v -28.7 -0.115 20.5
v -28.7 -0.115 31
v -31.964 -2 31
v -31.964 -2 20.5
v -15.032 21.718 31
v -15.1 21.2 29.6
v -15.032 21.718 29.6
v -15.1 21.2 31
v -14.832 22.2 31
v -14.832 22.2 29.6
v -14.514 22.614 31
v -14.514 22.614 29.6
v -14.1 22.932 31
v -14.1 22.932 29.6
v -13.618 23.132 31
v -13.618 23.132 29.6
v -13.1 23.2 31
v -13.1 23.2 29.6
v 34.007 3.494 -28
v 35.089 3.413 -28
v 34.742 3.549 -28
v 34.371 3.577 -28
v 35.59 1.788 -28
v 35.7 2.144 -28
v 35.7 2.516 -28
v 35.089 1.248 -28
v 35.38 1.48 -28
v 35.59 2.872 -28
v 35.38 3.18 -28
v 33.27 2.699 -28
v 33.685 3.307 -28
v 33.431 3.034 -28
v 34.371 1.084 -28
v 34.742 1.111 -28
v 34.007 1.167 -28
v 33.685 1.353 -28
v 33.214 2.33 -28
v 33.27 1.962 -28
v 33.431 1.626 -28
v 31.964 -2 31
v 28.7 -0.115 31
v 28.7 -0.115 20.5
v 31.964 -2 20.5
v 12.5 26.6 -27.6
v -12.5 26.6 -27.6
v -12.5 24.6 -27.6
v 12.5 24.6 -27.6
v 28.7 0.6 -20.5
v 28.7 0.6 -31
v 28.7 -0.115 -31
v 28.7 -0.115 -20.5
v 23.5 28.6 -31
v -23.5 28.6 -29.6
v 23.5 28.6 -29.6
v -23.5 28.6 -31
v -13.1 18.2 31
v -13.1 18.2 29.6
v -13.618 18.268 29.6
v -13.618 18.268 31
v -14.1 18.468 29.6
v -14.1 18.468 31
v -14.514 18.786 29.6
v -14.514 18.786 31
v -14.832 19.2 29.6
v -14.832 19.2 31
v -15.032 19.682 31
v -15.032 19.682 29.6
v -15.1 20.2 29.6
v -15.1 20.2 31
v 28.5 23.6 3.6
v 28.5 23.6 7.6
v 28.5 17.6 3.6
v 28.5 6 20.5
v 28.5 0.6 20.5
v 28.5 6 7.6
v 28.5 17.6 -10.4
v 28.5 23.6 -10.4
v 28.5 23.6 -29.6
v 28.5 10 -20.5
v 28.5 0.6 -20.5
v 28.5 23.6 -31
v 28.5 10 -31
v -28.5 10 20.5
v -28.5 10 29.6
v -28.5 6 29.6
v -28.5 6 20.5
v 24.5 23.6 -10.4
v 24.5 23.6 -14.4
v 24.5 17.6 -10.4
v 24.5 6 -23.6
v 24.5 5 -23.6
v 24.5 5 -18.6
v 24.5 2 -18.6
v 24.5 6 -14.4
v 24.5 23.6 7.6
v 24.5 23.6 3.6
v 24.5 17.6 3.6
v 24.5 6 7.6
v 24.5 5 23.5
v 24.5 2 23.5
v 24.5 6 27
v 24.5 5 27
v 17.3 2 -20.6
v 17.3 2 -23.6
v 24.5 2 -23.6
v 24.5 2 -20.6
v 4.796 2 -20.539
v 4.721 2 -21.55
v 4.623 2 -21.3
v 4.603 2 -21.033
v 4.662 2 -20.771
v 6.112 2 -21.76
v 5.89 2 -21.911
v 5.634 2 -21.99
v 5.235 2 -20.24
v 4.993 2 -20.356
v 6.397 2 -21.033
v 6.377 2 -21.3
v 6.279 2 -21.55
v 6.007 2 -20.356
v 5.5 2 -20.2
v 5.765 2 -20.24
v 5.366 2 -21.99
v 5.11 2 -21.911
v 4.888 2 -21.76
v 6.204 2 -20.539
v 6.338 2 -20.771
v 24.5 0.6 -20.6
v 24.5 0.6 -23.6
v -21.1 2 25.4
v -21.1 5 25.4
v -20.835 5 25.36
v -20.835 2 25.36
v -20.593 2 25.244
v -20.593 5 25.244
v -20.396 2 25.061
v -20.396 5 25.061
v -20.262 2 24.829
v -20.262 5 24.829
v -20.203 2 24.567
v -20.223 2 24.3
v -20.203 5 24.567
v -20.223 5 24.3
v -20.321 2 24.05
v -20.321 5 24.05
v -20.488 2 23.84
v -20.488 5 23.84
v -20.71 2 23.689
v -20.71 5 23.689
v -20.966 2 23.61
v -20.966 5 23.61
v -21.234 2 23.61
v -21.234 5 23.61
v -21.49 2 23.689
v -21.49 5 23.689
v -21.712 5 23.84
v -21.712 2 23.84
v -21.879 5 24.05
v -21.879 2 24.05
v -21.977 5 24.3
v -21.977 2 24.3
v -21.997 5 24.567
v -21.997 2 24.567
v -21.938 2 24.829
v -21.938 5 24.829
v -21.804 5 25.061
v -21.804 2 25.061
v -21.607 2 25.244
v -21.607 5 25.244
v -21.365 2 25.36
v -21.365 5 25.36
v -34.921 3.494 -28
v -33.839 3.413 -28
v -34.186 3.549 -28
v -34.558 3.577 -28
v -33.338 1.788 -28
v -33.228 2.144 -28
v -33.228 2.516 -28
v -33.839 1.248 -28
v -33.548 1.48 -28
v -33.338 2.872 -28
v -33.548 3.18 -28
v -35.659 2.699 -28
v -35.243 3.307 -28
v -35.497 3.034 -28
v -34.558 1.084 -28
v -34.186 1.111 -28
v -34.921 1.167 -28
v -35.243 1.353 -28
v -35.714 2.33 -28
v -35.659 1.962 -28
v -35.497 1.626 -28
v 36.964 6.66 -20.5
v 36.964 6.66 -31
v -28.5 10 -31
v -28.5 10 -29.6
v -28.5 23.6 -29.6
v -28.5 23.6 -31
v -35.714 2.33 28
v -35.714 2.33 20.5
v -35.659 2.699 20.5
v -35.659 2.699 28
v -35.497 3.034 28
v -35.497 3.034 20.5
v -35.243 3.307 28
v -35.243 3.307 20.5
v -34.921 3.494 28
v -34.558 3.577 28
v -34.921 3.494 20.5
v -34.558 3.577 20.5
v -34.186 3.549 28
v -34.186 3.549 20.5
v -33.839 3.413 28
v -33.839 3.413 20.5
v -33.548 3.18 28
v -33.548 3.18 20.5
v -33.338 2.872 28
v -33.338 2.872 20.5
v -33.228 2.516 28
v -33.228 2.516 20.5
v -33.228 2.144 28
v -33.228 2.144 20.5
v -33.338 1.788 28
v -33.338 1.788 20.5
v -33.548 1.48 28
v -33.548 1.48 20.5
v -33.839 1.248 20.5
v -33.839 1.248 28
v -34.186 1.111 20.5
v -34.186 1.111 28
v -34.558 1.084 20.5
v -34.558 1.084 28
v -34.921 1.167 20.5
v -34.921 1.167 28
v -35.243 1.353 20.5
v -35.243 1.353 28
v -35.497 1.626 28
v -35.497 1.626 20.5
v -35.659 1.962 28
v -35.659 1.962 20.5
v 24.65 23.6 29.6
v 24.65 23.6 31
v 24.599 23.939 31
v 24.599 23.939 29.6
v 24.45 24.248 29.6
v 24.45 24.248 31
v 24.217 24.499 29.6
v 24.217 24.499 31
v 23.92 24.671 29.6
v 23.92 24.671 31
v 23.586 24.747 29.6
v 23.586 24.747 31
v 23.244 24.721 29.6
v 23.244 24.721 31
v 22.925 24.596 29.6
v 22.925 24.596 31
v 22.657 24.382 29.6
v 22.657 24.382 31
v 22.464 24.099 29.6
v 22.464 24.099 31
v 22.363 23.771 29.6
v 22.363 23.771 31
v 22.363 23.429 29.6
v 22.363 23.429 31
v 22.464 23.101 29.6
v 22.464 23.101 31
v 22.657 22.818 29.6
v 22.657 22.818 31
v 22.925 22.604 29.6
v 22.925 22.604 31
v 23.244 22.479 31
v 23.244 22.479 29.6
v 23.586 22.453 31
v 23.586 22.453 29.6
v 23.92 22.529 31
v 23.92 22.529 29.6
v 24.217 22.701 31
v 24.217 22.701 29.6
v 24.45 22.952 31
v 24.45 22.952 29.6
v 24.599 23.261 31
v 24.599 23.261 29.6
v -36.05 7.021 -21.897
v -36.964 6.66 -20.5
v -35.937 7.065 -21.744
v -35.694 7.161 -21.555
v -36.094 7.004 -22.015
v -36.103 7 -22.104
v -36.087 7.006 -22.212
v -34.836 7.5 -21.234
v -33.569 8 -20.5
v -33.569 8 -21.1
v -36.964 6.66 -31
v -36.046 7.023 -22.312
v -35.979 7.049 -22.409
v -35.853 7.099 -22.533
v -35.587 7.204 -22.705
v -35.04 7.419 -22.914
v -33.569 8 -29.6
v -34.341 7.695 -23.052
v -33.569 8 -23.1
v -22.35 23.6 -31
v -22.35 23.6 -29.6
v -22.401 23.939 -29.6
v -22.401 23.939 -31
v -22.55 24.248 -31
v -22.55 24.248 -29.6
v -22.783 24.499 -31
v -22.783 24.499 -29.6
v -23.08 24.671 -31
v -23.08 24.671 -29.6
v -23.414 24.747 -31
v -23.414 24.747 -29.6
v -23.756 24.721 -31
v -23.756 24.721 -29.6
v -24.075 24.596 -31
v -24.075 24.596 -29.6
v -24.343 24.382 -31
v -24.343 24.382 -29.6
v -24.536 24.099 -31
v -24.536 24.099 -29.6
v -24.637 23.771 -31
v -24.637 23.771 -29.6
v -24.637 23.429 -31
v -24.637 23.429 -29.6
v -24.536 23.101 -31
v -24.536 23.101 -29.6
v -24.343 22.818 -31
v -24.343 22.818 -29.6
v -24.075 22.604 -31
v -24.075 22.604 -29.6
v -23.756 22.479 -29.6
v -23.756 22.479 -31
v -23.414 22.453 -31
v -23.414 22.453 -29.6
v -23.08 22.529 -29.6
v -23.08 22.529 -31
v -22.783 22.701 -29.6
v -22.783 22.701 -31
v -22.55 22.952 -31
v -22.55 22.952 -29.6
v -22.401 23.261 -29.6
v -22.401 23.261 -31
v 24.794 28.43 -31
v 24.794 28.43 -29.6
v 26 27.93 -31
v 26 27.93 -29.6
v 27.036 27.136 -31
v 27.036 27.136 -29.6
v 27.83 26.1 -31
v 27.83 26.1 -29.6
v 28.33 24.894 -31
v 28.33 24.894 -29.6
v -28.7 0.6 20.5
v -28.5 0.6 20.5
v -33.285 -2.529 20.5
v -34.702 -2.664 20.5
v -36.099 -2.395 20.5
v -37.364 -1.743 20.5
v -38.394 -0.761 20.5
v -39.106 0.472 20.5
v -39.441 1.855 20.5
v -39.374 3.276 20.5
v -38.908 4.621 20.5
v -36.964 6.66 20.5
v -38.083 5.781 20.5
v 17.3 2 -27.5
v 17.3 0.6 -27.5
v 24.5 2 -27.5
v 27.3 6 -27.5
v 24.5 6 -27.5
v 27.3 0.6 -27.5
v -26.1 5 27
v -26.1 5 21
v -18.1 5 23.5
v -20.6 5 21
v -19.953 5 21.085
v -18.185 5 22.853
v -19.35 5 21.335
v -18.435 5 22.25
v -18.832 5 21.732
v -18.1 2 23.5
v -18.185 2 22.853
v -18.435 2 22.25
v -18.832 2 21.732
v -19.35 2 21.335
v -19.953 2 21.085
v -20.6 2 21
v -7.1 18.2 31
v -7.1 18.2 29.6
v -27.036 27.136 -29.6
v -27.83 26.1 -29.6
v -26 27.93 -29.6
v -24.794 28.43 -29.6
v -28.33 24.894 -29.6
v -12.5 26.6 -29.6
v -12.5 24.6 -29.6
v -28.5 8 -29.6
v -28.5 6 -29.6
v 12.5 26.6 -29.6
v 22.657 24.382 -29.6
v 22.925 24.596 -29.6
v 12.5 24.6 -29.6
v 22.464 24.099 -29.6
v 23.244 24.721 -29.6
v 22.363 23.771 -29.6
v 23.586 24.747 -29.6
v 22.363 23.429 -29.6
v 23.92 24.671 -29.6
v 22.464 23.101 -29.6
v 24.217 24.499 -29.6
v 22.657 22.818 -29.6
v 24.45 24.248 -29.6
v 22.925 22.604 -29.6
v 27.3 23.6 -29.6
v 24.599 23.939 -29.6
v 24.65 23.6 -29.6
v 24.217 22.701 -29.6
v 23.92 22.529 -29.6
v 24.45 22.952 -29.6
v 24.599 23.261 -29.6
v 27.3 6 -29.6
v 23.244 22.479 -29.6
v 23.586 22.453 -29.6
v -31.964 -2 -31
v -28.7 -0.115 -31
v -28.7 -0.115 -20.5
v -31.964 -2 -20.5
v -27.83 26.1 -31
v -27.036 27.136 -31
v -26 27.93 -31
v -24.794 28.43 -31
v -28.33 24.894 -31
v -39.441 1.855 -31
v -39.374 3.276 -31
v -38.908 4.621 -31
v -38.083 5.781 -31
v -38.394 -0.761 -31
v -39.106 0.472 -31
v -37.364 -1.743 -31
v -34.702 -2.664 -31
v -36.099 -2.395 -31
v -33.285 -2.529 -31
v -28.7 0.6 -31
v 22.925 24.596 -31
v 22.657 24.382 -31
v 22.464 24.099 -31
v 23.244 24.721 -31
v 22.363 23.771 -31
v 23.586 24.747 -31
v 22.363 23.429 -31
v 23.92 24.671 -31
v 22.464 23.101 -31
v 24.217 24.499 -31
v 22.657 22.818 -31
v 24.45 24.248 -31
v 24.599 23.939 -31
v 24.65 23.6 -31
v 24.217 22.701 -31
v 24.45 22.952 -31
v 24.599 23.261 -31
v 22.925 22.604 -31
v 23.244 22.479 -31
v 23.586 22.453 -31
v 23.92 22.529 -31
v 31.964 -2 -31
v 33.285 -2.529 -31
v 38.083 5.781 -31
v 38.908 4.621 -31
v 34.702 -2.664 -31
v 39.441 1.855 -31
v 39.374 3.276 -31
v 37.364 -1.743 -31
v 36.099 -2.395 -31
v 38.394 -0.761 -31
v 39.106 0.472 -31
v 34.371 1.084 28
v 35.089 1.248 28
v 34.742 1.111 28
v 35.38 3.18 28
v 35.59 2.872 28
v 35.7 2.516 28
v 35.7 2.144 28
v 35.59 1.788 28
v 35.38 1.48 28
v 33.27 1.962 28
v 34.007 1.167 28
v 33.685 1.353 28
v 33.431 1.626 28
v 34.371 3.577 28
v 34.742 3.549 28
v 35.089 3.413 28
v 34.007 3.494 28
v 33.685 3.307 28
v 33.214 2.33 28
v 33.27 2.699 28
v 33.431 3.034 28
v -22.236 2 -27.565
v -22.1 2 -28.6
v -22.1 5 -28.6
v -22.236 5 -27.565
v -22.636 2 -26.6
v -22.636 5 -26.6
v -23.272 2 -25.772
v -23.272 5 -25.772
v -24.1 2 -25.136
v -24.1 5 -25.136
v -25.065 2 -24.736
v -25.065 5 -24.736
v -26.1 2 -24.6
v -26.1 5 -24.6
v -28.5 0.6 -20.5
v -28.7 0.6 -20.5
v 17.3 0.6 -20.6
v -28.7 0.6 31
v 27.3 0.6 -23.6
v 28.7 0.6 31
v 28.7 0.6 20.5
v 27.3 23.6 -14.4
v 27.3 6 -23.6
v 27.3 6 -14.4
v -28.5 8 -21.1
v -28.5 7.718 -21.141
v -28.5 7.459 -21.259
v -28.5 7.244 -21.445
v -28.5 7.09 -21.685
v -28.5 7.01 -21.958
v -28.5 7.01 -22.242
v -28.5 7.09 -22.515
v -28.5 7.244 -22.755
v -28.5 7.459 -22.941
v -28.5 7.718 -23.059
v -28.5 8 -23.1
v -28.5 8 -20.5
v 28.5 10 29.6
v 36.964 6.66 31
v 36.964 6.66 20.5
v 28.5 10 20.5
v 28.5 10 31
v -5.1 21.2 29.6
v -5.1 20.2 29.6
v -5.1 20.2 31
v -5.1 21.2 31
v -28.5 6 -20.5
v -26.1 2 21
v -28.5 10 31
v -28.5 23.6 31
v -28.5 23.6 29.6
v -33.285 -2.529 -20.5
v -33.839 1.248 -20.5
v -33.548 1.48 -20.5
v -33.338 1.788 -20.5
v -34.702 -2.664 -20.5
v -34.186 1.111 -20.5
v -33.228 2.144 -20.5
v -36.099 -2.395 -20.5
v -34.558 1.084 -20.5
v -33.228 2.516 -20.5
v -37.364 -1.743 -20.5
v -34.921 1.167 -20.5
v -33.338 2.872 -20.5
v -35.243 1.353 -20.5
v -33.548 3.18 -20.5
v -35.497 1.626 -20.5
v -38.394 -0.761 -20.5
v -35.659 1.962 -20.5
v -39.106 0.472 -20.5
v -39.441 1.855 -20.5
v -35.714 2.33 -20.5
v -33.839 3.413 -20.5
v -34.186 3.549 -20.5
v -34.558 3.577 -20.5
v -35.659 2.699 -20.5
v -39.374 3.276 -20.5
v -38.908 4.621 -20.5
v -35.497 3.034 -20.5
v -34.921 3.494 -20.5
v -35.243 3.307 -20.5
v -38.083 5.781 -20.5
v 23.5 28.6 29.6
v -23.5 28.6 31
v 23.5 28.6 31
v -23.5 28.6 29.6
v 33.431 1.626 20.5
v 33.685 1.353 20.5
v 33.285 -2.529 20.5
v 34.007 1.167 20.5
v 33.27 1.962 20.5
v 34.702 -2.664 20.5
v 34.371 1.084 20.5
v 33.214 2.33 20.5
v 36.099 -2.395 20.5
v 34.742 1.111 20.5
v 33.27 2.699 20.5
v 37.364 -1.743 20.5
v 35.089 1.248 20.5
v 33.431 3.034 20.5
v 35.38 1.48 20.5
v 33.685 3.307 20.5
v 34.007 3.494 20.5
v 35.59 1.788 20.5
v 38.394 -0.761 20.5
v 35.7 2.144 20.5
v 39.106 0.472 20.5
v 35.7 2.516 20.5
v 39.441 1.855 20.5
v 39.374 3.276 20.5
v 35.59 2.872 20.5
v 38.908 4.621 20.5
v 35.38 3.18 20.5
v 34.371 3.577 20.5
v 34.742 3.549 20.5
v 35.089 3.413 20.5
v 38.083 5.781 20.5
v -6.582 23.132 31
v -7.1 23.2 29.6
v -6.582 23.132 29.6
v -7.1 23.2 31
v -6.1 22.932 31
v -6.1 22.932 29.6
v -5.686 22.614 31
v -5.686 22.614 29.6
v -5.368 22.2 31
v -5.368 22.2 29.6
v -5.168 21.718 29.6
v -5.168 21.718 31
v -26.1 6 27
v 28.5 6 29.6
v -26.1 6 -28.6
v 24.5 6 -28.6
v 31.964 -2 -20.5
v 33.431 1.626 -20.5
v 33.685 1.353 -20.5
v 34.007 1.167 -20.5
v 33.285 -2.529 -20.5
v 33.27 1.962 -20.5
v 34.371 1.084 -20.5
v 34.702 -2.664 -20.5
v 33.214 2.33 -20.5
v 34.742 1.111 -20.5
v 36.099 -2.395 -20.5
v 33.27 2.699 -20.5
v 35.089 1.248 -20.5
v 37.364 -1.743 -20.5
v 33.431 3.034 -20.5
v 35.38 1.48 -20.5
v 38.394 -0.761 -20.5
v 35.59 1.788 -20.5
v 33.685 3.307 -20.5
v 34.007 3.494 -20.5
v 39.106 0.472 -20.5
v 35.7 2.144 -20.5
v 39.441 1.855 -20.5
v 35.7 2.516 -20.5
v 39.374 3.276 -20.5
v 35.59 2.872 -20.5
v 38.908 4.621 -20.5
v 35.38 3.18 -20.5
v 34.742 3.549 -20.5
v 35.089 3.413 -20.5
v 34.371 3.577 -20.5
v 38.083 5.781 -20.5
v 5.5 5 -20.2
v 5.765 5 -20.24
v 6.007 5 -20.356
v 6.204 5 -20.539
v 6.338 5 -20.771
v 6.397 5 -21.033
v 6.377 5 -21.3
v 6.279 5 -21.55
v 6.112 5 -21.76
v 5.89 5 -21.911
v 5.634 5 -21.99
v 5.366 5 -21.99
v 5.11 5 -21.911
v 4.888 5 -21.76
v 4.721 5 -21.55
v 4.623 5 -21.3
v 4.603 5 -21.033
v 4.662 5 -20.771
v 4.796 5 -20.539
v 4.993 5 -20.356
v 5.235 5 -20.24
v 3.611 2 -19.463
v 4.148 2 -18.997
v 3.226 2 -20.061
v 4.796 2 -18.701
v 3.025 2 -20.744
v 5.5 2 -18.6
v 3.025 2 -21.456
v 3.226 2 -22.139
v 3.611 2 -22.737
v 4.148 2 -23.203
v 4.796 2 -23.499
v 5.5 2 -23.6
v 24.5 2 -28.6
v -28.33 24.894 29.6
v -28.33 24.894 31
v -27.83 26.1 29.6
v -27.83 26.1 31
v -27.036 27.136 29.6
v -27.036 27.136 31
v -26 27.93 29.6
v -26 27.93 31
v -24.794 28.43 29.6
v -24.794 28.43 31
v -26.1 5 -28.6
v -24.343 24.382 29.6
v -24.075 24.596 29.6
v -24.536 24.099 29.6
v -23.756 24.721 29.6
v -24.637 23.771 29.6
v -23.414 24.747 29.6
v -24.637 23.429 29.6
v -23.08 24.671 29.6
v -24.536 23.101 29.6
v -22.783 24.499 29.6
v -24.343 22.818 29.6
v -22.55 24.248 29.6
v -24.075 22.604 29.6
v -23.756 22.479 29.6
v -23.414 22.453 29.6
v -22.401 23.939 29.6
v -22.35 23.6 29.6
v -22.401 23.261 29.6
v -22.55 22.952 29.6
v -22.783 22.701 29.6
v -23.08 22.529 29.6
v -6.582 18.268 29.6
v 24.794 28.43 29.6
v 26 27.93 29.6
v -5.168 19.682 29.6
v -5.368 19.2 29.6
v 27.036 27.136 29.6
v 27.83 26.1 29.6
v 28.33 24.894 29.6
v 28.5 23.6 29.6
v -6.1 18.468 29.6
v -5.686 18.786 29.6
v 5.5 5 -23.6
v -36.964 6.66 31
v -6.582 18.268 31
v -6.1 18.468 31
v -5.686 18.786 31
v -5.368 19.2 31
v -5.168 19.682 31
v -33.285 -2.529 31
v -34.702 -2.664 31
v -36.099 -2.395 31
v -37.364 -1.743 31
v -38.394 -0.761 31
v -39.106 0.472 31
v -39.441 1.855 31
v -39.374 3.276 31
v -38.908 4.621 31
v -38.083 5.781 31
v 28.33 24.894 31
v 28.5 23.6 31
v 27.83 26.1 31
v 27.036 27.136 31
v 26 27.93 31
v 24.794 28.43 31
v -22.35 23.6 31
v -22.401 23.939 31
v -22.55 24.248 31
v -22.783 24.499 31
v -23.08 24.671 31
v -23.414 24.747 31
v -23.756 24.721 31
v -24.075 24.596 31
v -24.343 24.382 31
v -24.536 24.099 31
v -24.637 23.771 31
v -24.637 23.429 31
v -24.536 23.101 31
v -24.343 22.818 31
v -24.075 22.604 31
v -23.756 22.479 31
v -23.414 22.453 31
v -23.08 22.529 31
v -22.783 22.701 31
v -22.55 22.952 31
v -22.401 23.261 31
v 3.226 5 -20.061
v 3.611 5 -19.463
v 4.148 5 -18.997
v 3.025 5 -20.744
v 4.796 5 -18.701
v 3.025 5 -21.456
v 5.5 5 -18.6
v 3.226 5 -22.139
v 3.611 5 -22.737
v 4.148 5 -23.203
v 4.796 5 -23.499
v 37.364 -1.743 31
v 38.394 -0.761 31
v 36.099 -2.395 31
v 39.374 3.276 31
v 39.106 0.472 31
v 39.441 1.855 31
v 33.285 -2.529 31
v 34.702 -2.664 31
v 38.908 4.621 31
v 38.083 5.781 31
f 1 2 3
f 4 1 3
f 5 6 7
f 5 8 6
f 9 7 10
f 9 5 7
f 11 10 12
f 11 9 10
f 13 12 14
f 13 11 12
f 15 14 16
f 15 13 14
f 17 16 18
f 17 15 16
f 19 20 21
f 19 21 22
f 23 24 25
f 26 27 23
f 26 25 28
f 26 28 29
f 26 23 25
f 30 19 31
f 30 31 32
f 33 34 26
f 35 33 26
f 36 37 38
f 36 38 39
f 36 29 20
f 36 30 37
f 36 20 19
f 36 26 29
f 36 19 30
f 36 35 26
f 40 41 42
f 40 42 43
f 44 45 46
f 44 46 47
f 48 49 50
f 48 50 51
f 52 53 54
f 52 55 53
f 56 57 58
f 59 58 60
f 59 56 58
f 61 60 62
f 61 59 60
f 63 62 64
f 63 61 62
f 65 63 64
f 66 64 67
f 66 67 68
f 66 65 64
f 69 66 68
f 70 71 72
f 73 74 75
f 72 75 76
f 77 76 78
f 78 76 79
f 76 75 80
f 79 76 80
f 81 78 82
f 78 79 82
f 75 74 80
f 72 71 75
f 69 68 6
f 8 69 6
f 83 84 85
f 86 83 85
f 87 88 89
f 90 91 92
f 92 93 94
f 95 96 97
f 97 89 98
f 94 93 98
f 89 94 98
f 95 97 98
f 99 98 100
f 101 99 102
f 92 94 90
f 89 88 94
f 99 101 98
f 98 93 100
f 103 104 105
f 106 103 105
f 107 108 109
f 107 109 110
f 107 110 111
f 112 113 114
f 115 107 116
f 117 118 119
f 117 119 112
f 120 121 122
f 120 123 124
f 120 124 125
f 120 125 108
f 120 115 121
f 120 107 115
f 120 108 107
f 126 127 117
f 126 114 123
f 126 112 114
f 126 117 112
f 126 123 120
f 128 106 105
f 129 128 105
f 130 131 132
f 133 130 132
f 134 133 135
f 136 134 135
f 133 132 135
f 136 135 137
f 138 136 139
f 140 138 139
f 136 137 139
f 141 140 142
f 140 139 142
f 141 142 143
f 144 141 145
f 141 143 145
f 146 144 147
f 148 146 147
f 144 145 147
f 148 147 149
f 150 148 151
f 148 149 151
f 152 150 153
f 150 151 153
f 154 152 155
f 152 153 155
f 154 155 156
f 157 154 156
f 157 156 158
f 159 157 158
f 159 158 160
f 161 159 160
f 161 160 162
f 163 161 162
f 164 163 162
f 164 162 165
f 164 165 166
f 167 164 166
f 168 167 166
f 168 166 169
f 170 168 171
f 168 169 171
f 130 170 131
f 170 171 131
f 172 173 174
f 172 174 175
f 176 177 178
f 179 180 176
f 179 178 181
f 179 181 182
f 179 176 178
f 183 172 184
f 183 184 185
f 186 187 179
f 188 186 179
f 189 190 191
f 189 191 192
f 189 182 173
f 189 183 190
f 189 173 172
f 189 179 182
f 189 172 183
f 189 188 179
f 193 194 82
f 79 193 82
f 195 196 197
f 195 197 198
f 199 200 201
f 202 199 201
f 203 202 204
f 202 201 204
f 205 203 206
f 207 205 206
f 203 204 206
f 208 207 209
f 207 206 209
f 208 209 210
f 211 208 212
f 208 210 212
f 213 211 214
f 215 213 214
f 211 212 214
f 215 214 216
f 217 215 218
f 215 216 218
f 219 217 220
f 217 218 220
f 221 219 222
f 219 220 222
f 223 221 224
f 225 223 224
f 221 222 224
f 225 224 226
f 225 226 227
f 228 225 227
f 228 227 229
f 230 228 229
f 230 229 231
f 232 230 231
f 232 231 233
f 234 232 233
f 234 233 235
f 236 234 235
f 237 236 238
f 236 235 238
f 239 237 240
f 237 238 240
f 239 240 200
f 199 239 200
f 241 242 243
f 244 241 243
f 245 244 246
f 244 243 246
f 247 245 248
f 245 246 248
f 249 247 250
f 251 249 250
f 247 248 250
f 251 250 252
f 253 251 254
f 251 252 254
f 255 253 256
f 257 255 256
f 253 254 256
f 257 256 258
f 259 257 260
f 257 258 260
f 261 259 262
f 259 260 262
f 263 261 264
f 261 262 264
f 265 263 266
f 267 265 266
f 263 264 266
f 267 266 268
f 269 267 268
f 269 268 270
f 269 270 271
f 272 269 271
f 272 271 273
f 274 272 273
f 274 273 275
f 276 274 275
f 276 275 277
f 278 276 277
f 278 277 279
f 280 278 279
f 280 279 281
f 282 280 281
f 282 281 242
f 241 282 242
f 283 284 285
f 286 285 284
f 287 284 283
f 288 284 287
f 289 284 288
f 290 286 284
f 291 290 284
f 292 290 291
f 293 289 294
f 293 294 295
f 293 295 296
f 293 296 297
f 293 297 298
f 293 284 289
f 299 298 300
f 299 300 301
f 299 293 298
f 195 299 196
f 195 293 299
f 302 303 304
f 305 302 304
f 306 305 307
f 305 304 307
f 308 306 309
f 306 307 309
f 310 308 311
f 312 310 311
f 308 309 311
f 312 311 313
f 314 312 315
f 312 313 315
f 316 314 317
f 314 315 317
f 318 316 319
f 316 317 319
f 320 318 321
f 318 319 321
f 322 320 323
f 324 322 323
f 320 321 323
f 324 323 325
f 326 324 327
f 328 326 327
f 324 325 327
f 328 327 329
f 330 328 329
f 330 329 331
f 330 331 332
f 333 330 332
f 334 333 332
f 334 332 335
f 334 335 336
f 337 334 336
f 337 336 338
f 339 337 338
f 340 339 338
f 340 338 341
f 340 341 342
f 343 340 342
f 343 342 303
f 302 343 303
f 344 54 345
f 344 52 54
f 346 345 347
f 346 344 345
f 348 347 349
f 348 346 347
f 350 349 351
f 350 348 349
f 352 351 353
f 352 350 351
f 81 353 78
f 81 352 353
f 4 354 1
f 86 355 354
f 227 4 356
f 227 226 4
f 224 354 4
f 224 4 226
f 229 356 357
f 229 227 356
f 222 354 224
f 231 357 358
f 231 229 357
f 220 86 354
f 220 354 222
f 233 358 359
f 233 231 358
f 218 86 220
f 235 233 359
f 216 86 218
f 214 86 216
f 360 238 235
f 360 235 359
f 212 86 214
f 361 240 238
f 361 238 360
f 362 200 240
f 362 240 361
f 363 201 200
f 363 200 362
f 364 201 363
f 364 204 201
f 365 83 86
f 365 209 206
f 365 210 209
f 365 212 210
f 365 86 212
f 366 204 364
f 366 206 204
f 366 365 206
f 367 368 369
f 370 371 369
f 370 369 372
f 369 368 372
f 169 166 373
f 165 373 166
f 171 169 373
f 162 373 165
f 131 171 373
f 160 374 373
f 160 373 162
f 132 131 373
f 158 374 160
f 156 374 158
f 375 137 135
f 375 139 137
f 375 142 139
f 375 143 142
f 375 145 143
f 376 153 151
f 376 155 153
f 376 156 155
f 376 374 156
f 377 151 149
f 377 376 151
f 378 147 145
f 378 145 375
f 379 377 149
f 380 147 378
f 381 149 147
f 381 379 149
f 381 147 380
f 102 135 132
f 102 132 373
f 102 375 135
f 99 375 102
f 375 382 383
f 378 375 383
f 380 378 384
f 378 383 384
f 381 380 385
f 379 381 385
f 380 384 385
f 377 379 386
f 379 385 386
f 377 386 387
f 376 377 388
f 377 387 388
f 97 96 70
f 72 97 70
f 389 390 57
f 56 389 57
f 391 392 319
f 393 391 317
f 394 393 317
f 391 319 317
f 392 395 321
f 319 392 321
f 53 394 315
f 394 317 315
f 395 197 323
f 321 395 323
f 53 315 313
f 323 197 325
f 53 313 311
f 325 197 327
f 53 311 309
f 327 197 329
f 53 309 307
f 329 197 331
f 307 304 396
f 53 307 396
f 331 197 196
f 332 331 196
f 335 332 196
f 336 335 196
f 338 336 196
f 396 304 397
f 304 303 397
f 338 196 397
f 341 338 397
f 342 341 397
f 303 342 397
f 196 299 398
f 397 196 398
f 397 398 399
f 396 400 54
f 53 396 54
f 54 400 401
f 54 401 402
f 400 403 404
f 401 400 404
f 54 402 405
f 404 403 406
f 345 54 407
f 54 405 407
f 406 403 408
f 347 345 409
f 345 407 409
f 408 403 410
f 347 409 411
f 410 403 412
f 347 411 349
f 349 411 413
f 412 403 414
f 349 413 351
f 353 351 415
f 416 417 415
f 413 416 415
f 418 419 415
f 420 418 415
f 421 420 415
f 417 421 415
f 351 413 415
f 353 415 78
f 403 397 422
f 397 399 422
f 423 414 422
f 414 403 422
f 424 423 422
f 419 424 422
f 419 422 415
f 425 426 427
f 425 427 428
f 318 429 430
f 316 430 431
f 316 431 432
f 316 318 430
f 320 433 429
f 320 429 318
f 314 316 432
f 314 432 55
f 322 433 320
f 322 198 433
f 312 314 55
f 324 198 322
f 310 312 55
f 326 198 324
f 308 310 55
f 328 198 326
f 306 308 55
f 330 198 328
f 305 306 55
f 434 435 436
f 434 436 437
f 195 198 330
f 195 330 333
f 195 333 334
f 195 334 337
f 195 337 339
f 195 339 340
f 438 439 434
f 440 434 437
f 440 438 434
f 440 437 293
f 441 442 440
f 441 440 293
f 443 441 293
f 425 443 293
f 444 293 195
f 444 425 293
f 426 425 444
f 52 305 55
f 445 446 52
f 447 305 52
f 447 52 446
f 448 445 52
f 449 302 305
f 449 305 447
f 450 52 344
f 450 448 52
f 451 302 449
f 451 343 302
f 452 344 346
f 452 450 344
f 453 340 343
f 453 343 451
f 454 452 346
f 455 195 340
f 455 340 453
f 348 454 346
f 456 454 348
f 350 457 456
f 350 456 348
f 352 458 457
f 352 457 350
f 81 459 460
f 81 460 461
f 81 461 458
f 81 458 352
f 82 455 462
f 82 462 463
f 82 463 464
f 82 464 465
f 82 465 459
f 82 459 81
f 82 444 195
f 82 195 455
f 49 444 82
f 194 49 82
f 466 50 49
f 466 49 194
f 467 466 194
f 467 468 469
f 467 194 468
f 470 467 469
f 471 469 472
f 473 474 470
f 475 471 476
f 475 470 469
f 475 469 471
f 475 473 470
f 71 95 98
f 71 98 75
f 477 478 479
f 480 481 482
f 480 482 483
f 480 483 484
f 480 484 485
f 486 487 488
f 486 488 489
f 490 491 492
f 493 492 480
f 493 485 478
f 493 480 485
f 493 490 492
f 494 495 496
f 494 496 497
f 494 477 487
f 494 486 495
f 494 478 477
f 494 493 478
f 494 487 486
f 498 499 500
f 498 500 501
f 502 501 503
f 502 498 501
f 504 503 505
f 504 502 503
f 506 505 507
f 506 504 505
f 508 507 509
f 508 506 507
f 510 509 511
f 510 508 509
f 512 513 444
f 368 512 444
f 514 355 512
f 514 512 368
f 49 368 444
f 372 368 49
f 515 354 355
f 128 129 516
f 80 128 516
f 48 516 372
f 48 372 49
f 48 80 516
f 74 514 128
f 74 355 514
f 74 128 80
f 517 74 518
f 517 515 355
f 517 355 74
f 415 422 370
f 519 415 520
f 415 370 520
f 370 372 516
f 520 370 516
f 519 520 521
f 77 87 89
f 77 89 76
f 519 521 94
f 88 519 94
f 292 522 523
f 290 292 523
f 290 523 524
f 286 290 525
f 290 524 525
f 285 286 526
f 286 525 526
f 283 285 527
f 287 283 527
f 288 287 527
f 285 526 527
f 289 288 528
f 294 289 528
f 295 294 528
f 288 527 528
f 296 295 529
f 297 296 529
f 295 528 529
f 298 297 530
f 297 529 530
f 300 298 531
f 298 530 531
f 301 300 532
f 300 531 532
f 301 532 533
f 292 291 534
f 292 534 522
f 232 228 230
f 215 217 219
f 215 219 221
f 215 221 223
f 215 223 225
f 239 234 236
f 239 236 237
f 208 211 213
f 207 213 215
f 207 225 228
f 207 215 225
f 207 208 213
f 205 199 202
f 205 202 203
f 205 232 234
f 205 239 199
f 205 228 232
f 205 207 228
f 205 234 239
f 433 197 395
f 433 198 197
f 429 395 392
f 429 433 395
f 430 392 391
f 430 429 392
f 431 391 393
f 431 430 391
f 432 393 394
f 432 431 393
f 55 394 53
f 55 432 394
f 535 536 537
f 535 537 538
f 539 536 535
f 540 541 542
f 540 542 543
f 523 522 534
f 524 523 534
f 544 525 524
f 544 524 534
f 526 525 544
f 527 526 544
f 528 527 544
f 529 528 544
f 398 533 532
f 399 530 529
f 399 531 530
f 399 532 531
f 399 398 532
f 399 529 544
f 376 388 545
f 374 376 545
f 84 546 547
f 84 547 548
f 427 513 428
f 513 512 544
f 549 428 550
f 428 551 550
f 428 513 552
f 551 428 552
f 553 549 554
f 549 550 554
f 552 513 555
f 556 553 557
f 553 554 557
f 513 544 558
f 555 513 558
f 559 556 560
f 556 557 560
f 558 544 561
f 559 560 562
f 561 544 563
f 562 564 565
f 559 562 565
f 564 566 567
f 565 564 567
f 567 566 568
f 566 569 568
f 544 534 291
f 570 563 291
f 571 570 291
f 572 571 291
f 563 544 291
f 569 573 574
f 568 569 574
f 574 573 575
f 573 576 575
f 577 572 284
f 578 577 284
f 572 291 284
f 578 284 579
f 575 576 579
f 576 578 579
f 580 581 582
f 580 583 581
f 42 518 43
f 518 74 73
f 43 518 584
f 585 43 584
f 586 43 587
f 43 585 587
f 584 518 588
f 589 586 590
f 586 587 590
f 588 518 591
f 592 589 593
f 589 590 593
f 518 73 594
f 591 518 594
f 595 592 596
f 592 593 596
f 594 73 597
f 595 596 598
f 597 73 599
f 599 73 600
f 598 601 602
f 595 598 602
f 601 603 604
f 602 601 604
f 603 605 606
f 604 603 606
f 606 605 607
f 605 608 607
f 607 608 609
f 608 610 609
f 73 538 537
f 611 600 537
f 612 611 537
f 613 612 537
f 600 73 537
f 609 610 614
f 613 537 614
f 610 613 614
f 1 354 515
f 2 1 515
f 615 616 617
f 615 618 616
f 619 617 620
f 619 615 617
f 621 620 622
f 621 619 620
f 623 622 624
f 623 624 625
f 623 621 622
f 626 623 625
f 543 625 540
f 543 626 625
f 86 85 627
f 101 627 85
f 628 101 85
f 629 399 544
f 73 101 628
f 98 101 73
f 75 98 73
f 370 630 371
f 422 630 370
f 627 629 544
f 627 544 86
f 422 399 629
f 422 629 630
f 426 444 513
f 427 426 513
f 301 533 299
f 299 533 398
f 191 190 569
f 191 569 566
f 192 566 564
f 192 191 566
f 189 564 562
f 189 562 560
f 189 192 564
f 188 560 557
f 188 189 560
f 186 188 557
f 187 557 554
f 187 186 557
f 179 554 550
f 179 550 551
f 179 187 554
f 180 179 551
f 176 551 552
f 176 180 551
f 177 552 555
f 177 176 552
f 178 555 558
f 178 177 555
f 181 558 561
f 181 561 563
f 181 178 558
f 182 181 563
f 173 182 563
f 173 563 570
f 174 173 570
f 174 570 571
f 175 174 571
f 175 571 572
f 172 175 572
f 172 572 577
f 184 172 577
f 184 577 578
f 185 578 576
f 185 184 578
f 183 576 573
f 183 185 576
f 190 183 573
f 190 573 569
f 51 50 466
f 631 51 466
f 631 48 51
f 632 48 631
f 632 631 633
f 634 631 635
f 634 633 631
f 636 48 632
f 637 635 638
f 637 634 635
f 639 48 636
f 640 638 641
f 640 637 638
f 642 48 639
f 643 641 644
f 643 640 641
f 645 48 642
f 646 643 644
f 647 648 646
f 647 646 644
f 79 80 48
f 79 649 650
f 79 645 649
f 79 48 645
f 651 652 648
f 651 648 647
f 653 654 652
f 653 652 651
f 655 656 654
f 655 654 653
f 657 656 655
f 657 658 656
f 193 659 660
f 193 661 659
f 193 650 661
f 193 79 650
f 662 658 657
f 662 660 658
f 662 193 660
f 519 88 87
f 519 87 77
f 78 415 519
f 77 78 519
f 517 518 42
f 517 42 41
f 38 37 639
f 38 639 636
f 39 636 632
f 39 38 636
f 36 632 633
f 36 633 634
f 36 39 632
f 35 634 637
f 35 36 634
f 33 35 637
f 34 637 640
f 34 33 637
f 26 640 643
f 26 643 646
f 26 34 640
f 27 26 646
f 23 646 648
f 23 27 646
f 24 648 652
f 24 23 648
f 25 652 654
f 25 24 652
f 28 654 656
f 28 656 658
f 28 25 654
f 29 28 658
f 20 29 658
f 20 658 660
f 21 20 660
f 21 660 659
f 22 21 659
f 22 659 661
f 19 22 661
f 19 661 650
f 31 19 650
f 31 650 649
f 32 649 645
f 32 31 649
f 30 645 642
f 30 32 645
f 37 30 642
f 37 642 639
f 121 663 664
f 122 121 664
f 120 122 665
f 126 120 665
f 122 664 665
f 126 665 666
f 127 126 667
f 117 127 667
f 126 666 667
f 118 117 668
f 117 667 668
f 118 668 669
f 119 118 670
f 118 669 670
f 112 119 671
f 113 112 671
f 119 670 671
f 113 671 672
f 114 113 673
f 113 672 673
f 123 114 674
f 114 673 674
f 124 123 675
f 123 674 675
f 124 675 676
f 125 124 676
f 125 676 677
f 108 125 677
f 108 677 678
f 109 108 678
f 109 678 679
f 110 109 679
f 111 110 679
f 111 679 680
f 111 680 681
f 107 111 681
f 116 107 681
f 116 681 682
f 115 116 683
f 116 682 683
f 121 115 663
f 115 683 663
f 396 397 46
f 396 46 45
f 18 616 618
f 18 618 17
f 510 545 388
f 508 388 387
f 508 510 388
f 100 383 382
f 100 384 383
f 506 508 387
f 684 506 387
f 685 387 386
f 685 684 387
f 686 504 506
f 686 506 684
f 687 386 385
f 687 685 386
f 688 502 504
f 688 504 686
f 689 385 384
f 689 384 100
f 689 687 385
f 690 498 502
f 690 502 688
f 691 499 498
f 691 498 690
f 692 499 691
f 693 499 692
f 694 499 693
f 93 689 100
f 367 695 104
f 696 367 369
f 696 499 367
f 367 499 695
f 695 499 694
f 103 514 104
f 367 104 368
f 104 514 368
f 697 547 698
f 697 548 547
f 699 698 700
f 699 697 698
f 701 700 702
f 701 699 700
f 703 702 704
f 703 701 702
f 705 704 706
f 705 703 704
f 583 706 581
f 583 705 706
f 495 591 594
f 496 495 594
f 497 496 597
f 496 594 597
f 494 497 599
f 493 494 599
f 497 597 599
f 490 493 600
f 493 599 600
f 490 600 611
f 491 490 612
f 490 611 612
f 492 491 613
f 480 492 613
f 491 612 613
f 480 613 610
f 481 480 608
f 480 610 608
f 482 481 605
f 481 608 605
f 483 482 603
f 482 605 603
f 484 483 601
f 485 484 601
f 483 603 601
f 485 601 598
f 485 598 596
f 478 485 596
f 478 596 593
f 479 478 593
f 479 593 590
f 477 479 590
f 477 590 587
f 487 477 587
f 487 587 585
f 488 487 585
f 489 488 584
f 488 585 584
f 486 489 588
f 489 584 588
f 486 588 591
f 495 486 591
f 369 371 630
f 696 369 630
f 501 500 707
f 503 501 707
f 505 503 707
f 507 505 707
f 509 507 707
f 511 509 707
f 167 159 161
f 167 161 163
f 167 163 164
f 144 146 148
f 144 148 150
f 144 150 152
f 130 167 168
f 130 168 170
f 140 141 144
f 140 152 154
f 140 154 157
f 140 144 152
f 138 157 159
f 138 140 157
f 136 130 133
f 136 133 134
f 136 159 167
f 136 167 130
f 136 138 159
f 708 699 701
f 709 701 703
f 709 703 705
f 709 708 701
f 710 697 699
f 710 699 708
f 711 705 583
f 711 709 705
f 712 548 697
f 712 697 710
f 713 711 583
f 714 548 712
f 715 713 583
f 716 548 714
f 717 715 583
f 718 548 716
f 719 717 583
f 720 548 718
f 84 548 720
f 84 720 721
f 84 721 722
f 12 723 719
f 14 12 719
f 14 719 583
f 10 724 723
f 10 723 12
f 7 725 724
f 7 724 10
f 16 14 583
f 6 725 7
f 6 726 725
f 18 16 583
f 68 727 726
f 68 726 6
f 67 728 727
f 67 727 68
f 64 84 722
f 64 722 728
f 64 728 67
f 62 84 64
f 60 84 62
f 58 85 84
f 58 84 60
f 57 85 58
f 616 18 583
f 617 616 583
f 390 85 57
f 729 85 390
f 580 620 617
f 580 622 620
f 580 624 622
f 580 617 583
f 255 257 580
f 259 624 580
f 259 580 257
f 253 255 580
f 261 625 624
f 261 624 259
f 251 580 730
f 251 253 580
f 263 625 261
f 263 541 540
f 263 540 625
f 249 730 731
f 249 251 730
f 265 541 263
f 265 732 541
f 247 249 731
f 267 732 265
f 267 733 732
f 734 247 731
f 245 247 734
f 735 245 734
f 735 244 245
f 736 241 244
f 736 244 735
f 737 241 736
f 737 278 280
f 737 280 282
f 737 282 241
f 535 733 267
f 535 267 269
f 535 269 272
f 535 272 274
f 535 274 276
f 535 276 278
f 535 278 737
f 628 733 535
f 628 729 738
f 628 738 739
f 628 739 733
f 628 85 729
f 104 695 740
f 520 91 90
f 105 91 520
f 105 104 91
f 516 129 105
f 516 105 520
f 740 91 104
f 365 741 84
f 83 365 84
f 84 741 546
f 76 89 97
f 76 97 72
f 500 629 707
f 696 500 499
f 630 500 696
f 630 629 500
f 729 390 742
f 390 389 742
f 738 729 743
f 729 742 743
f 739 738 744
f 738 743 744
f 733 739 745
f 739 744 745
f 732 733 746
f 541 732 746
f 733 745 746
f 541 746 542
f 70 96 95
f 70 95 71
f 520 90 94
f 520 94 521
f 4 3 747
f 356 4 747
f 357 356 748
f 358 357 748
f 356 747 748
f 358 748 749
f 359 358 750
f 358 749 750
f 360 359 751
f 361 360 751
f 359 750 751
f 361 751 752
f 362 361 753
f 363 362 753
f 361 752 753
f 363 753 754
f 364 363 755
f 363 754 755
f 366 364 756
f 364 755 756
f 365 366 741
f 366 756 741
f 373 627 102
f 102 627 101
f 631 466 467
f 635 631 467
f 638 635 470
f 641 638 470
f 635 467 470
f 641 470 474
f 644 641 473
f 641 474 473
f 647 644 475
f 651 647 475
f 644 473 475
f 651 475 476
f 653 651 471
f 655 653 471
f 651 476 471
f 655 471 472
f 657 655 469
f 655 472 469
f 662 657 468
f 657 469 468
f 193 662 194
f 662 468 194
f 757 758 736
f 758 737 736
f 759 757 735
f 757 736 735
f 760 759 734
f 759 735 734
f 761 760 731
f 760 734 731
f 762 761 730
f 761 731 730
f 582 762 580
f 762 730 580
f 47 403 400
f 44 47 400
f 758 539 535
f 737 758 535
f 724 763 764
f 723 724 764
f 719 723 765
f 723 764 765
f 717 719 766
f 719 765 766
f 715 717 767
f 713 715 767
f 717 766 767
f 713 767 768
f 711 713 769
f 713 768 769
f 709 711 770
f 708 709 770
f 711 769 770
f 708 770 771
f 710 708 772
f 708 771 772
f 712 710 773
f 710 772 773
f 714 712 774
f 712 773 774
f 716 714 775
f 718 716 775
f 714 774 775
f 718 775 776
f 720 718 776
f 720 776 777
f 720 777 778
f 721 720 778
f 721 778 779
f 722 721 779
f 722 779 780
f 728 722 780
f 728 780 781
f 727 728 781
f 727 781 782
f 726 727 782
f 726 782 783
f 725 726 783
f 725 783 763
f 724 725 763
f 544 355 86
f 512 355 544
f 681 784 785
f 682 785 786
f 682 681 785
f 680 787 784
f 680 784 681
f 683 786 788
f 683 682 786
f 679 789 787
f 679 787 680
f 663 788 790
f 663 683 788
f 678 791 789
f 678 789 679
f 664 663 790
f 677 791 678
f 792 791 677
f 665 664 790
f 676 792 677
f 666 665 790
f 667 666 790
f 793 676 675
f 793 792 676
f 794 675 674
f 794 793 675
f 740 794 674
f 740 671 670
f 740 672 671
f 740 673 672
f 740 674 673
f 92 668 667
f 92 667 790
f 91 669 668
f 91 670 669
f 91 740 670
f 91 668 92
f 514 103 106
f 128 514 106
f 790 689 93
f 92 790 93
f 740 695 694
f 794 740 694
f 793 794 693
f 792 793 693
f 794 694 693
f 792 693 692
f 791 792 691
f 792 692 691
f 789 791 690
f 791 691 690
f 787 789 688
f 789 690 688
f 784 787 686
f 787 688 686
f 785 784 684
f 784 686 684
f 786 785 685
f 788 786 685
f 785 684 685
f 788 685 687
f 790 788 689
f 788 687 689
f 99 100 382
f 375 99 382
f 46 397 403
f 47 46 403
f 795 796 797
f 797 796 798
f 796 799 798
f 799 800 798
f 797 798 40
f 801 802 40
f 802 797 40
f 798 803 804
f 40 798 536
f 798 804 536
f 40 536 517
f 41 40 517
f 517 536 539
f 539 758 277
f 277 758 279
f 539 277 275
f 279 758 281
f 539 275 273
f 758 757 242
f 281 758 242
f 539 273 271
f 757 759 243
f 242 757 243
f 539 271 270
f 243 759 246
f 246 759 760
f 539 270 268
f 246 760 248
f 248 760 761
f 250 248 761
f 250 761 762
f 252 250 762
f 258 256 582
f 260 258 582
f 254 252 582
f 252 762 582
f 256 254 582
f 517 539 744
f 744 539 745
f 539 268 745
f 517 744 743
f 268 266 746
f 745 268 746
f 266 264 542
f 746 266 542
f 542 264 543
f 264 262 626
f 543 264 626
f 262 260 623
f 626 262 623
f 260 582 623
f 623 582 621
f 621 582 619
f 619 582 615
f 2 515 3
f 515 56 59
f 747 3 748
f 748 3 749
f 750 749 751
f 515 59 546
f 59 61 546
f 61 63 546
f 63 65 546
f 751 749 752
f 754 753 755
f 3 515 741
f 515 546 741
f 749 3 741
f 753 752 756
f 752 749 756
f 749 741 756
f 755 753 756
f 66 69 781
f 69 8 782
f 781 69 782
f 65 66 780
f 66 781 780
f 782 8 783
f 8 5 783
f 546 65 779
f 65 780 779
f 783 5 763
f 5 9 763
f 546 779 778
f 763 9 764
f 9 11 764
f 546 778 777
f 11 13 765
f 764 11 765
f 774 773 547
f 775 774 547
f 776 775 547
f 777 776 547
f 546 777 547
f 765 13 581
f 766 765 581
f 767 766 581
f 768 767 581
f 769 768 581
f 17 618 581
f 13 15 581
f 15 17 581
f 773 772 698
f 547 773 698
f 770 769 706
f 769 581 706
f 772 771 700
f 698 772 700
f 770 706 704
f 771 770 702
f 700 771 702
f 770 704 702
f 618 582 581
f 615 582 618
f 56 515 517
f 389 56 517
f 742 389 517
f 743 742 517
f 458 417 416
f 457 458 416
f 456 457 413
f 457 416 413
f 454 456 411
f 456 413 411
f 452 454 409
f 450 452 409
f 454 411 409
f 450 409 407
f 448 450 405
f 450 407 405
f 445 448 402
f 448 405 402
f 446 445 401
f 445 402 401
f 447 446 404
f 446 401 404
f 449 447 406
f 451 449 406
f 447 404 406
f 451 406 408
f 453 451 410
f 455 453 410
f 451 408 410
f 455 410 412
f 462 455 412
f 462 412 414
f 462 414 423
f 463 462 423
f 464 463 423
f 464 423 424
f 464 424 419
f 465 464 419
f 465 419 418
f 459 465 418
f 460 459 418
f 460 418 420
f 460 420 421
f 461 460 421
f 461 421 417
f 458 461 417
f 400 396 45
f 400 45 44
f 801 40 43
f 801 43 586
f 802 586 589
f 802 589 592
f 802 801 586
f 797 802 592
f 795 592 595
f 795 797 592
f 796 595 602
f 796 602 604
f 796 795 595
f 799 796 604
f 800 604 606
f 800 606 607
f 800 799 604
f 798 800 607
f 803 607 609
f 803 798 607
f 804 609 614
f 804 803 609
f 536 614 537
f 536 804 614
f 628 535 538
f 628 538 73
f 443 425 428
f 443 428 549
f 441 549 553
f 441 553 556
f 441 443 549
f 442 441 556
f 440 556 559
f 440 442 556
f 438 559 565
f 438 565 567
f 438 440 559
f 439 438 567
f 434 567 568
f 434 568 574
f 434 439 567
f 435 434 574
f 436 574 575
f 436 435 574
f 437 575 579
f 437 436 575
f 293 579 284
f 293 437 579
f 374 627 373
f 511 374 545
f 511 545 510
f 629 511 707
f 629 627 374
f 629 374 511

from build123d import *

# Parameters (mm, degrees)
SKETCH1_W                = 57
SKETCH1_H                = 62
BOSS_EXTRUDE1_DEPTH      = 6
SKETCH4_W                = 50.6
SKETCH4_H                = 55.6
CUT_EXTRUDE1_DEPTH       = 4
BOSS_EXTRUDE2_DEPTH      = 3
SKETCH6_R                = 0.9
CUT_EXTRUDE2_DEPTH       = 3
BOSS_EXTRUDE3_DEPTH      = 10.5
SKETCH8_R                = 1.25
CUT_EXTRUDE3_DEPTH       = 7.5
CUT_EXTRUDE4_START       = -7.5
SKETCH9_R                = 1.25
CUT_EXTRUDE4_DEPTH       = 7.5
SKETCH10_W               = 57
SKETCH10_H               = 1.4
BOSS_EXTRUDE4_DEPTH      = 22.6
FILLET2_R                = 5
CUT_EXTRUDE8_DEPTH       = 57.79766999
CUT_EXTRUDE8_DEPTH_BACK  = 57.79766999
SKETCH15_W               = 10
SKETCH15_H               = 3.9
SKETCH18_W               = 10
SKETCH18_H               = 5
CUT_EXTRUDE10_DEPTH      = 78.76718663
FILLET3_R                = 2
CUT_EXTRUDE12_DEPTH      = 80.987993526
SKETCH19_R               = 1.15
CUT_EXTRUDE11_DEPTH      = 79.86301615
SKETCH21_W               = 7.2
SKETCH21_H               = 3
CUT_EXTRUDE13_DEPTH      = 57.79766999
CUT_EXTRUDE14_DEPTH      = 58.761365256
CUT_EXTRUDE14_DEPTH_BACK = 0.6
SKETCH22_W               = 57.4
SKETCH22_H               = 62
BOSS_EXTRUDE6_DEPTH      = 17.6
SKETCH24_W               = 4
SKETCH24_H               = 14
CUT_EXTRUDE15_DEPTH      = 6
SKETCH25_W               = 25
SKETCH25_H               = 2
BOSS_EXTRUDE7_DEPTH      = 2


with BuildPart() as part:
    # Sketch1 → Boss-Extrude1 (new body)
    with BuildSketch(Plane(origin=(0, 0, 0), x_dir=(1, 0, 0), z_dir=(0, 1, 0))):
        Rectangle(SKETCH1_W, SKETCH1_H)
    extrude(amount=BOSS_EXTRUDE1_DEPTH)

    # Sketch4 → Cut-Extrude1 (cut)
    with BuildSketch(Plane(origin=(0, 6, 0), x_dir=(1, 0, 0), z_dir=(0, 1, 0))):
        with Locations((-0.8, 0.8)):
            Rectangle(SKETCH4_W, SKETCH4_H)
    extrude(amount=-CUT_EXTRUDE1_DEPTH, mode=Mode.SUBTRACT)

    # Sketch5 → Boss-Extrude2 (add)
    with BuildSketch(Plane(origin=(0, 2, 0), x_dir=(1, 0, 0), z_dir=(0, 1, 0))):
        with BuildLine():
            Line((-26.1, -27), (-18.1, -27))
            Line((-18.1, -27), (24.5, -27))
            Line((24.5, -27), (24.5, -23.5))
            Line((24.5, -23.5), (-18.1, -23.5))
            ThreePointArc((-18.1, -23.5), (-18.832233047, -21.732233047), (-20.6, -21))
            Line((-20.6, -21), (-26.1, -21))
            Line((-26.1, -21), (-26.1, -27))
        make_face()
        with BuildLine():
            Line((24.5, 23.6), (5.5, 23.6))
            ThreePointArc((5.5, 23.6), (3, 21.1), (5.5, 18.6))
            Line((5.5, 18.6), (24.5, 18.6))
            Line((24.5, 18.6), (24.5, 23.6))
        make_face()
        with BuildLine():
            Line((-26.1, 24.6), (-26.1, 28.6))
            Line((-26.1, 28.6), (-22.1, 28.6))
            ThreePointArc((-22.1, 28.6), (-23.271572875, 25.771572875), (-26.1, 24.6))
        make_face()
    extrude(amount=BOSS_EXTRUDE2_DEPTH)

    # Sketch6 → Cut-Extrude2 (cut)
    with BuildSketch(Plane(origin=(0, 5, 0), x_dir=(1, 0, 0), z_dir=(0, 1, 0))):
        with Locations(Location((5.5, 21.1, 0), (0, 0, 270))):
            Circle(SKETCH6_R)
        with Locations(Location((-21.1, -24.5, 0), (0, 0, 270))):
            Circle(SKETCH6_R)
    extrude(amount=-CUT_EXTRUDE2_DEPTH, mode=Mode.SUBTRACT)

    # Sketch7 → Boss-Extrude3 (add)
    with BuildSketch(Plane.XY.offset(31)):
        with BuildLine():
            Line((-28.5, 0), (-31.964101615, -2))
            ThreePointArc((-31.964101615, -2), (-38.794228634, -0.169872981), (-36.964101615, 6.660254038))
            Line((-36.964101615, 6.660254038), (-28.5, 10))
            Line((-28.5, 10), (-28.5, 0))
        make_face()
        with BuildLine():
            Line((36.964101615, 6.660254038), (28.5, 10))
            Line((28.5, 10), (28.5, 0))
            Line((28.5, 0), (31.964101615, -2))
            ThreePointArc((31.964101615, -2), (38.794228634, -0.169872981), (36.964101615, 6.660254038))
        make_face()
    boss_extrude3 = extrude(amount=-BOSS_EXTRUDE3_DEPTH)

    # Mirror4: Boss-Extrude3 across plane
    add(boss_extrude3.mirror(Plane.XY))

    # Sketch8 → Cut-Extrude3 (cut)
    with BuildSketch(Plane(origin=(0, 0, 20.5), x_dir=(-1, 0, 0), z_dir=(0, 0, -1))):
        with Locations((34.464101615, 2.330127019)):
            Circle(SKETCH8_R)
        with Locations((-34.464101615, 2.330127019)):
            Circle(SKETCH8_R)
    extrude(amount=-CUT_EXTRUDE3_DEPTH, mode=Mode.SUBTRACT)

    # Sketch9 → Cut-Extrude4 (cut)
    with BuildSketch(Plane.XY.offset(-20.5).offset(CUT_EXTRUDE4_START)):
        with Locations(Location((-34.464101615, 2.330127019, 0), (0, 0, 180))):
            Circle(SKETCH9_R)
        with Locations(Location((34.464101615, 2.330127019, 0), (0, 0, 180))):
            Circle(SKETCH9_R)
    extrude(amount=CUT_EXTRUDE4_DEPTH, mode=Mode.SUBTRACT)

    # Sketch10 → Boss-Extrude4 (add)
    with BuildSketch(Plane(origin=(0, 6, 0), x_dir=(1, 0, 0), z_dir=(0, 1, 0))):
        with Locations((0, 30.3)):
            Rectangle(SKETCH10_W, SKETCH10_H)
        with Locations((0, -30.3)):
            Rectangle(SKETCH10_W, SKETCH10_H)
    extrude(amount=BOSS_EXTRUDE4_DEPTH)

    # Fillet2
    fillet2_edges = [part.edges().sort_by_distance(p)[0] for p in [
        (-28.5, 28.6, -30.3),
        (28.5, 28.6, -30.3),
        (-28.5, 28.6, 30.3),
        (28.5, 28.6, 30.3),
    ]]
    fillet(fillet2_edges, radius=FILLET2_R)

    # Sketch15 → Cut-Extrude8 (cut, two sides: drawn at the far end of the back side and taken through both)
    with BuildSketch(Plane(origin=(0, 2, 0), x_dir=(1, 0, 0), z_dir=(0, 1, 0)).offset(-CUT_EXTRUDE8_DEPTH_BACK)):
        with Locations((22.3, 25.55)):
            Rectangle(SKETCH15_W, SKETCH15_H)
    extrude(amount=CUT_EXTRUDE8_DEPTH + CUT_EXTRUDE8_DEPTH_BACK, mode=Mode.SUBTRACT)

    # Sketch18 → Cut-Extrude10 (cut, through all)
    with BuildSketch(Plane(origin=(0, 0, 29.6), x_dir=(-1, 0, 0), z_dir=(0, 0, -1))):
        with Locations((10.1, 20.7)):
            Rectangle(SKETCH18_W, SKETCH18_H)
    extrude(amount=-CUT_EXTRUDE10_DEPTH, mode=Mode.SUBTRACT)

    # Fillet3
    fillet3_edges = [part.edges().sort_by_distance(p)[0] for p in [
        (-5.1, 18.2, 30.3),
        (-5.1, 23.2, 30.3),
        (-15.1, 23.2, 30.3),
        (-15.1, 18.2, 30.3),
    ]]
    fillet(fillet3_edges, radius=FILLET3_R)

    # Sketch20 → Cut-Extrude12 (cut, through all)
    with BuildSketch(Plane(origin=(-28.5, 0, 0), x_dir=(0, 0, -1), z_dir=(1, 0, 0))):
        with BuildLine():
            Line((29.6, 8), (29.6, 10))
            Line((29.6, 10), (20.5, 10))
            Line((20.5, 10), (20.5, 8))
            Line((20.5, 8), (21.1, 8))
            ThreePointArc((21.1, 8), (22.1, 7), (23.1, 8))
            Line((23.1, 8), (29.6, 8))
        make_face()
    extrude(amount=-CUT_EXTRUDE12_DEPTH, mode=Mode.SUBTRACT)

    # Sketch19 → Cut-Extrude11 (cut, through all)
    with BuildSketch(Plane.XY.offset(31)):
        with Locations((-23.5, 23.6)):
            Circle(SKETCH19_R)
        with Locations((23.5, 23.6)):
            Circle(SKETCH19_R)
    extrude(amount=-CUT_EXTRUDE11_DEPTH, mode=Mode.SUBTRACT)

    # Sketch21 → Cut-Extrude13 (cut, through all)
    with BuildSketch(Plane(origin=(0, 2, 0), x_dir=(1, 0, 0), z_dir=(0, 1, 0))):
        with Locations((20.9, 22.1)):
            Rectangle(SKETCH21_W, SKETCH21_H)
    extrude(amount=-CUT_EXTRUDE13_DEPTH, mode=Mode.SUBTRACT)

    # Sketch22 → Cut-Extrude14 (cut, two sides: drawn at the far end of the back side and taken through both)
    with BuildSketch(Plane.XZ.offset(-CUT_EXTRUDE14_DEPTH_BACK)):
        Rectangle(SKETCH22_W, SKETCH22_H)
    extrude(amount=CUT_EXTRUDE14_DEPTH + CUT_EXTRUDE14_DEPTH_BACK, mode=Mode.SUBTRACT)

    # Sketch23 → Boss-Extrude6 (add)
    with BuildSketch(Plane(origin=(0, 6, 0), x_dir=(1, 0, 0), z_dir=(0, 1, 0))):
        Polygon((24.5, -7.6), (28.5, -7.6), (28.5, 29.6), (27.3, 29.6), (27.3, 14.4), (24.5, 14.4), align=None)
    extrude(amount=BOSS_EXTRUDE6_DEPTH)

    # Sketch24 → Cut-Extrude15 (cut)
    with BuildSketch(Plane(origin=(0, 23.6, 0), x_dir=(1, 0, 0), z_dir=(0, 1, 0))):
        with Locations((26.5, 3.4)):
            Rectangle(SKETCH24_W, SKETCH24_H)
    extrude(amount=-CUT_EXTRUDE15_DEPTH, mode=Mode.SUBTRACT)

    # Sketch25 → Boss-Extrude7 (add)
    with BuildSketch(Plane.XY.offset(-29.6)):
        with Locations((0, 25.6)):
            Rectangle(SKETCH25_W, SKETCH25_H)
    extrude(amount=BOSS_EXTRUDE7_DEPTH)


solid = part.part
